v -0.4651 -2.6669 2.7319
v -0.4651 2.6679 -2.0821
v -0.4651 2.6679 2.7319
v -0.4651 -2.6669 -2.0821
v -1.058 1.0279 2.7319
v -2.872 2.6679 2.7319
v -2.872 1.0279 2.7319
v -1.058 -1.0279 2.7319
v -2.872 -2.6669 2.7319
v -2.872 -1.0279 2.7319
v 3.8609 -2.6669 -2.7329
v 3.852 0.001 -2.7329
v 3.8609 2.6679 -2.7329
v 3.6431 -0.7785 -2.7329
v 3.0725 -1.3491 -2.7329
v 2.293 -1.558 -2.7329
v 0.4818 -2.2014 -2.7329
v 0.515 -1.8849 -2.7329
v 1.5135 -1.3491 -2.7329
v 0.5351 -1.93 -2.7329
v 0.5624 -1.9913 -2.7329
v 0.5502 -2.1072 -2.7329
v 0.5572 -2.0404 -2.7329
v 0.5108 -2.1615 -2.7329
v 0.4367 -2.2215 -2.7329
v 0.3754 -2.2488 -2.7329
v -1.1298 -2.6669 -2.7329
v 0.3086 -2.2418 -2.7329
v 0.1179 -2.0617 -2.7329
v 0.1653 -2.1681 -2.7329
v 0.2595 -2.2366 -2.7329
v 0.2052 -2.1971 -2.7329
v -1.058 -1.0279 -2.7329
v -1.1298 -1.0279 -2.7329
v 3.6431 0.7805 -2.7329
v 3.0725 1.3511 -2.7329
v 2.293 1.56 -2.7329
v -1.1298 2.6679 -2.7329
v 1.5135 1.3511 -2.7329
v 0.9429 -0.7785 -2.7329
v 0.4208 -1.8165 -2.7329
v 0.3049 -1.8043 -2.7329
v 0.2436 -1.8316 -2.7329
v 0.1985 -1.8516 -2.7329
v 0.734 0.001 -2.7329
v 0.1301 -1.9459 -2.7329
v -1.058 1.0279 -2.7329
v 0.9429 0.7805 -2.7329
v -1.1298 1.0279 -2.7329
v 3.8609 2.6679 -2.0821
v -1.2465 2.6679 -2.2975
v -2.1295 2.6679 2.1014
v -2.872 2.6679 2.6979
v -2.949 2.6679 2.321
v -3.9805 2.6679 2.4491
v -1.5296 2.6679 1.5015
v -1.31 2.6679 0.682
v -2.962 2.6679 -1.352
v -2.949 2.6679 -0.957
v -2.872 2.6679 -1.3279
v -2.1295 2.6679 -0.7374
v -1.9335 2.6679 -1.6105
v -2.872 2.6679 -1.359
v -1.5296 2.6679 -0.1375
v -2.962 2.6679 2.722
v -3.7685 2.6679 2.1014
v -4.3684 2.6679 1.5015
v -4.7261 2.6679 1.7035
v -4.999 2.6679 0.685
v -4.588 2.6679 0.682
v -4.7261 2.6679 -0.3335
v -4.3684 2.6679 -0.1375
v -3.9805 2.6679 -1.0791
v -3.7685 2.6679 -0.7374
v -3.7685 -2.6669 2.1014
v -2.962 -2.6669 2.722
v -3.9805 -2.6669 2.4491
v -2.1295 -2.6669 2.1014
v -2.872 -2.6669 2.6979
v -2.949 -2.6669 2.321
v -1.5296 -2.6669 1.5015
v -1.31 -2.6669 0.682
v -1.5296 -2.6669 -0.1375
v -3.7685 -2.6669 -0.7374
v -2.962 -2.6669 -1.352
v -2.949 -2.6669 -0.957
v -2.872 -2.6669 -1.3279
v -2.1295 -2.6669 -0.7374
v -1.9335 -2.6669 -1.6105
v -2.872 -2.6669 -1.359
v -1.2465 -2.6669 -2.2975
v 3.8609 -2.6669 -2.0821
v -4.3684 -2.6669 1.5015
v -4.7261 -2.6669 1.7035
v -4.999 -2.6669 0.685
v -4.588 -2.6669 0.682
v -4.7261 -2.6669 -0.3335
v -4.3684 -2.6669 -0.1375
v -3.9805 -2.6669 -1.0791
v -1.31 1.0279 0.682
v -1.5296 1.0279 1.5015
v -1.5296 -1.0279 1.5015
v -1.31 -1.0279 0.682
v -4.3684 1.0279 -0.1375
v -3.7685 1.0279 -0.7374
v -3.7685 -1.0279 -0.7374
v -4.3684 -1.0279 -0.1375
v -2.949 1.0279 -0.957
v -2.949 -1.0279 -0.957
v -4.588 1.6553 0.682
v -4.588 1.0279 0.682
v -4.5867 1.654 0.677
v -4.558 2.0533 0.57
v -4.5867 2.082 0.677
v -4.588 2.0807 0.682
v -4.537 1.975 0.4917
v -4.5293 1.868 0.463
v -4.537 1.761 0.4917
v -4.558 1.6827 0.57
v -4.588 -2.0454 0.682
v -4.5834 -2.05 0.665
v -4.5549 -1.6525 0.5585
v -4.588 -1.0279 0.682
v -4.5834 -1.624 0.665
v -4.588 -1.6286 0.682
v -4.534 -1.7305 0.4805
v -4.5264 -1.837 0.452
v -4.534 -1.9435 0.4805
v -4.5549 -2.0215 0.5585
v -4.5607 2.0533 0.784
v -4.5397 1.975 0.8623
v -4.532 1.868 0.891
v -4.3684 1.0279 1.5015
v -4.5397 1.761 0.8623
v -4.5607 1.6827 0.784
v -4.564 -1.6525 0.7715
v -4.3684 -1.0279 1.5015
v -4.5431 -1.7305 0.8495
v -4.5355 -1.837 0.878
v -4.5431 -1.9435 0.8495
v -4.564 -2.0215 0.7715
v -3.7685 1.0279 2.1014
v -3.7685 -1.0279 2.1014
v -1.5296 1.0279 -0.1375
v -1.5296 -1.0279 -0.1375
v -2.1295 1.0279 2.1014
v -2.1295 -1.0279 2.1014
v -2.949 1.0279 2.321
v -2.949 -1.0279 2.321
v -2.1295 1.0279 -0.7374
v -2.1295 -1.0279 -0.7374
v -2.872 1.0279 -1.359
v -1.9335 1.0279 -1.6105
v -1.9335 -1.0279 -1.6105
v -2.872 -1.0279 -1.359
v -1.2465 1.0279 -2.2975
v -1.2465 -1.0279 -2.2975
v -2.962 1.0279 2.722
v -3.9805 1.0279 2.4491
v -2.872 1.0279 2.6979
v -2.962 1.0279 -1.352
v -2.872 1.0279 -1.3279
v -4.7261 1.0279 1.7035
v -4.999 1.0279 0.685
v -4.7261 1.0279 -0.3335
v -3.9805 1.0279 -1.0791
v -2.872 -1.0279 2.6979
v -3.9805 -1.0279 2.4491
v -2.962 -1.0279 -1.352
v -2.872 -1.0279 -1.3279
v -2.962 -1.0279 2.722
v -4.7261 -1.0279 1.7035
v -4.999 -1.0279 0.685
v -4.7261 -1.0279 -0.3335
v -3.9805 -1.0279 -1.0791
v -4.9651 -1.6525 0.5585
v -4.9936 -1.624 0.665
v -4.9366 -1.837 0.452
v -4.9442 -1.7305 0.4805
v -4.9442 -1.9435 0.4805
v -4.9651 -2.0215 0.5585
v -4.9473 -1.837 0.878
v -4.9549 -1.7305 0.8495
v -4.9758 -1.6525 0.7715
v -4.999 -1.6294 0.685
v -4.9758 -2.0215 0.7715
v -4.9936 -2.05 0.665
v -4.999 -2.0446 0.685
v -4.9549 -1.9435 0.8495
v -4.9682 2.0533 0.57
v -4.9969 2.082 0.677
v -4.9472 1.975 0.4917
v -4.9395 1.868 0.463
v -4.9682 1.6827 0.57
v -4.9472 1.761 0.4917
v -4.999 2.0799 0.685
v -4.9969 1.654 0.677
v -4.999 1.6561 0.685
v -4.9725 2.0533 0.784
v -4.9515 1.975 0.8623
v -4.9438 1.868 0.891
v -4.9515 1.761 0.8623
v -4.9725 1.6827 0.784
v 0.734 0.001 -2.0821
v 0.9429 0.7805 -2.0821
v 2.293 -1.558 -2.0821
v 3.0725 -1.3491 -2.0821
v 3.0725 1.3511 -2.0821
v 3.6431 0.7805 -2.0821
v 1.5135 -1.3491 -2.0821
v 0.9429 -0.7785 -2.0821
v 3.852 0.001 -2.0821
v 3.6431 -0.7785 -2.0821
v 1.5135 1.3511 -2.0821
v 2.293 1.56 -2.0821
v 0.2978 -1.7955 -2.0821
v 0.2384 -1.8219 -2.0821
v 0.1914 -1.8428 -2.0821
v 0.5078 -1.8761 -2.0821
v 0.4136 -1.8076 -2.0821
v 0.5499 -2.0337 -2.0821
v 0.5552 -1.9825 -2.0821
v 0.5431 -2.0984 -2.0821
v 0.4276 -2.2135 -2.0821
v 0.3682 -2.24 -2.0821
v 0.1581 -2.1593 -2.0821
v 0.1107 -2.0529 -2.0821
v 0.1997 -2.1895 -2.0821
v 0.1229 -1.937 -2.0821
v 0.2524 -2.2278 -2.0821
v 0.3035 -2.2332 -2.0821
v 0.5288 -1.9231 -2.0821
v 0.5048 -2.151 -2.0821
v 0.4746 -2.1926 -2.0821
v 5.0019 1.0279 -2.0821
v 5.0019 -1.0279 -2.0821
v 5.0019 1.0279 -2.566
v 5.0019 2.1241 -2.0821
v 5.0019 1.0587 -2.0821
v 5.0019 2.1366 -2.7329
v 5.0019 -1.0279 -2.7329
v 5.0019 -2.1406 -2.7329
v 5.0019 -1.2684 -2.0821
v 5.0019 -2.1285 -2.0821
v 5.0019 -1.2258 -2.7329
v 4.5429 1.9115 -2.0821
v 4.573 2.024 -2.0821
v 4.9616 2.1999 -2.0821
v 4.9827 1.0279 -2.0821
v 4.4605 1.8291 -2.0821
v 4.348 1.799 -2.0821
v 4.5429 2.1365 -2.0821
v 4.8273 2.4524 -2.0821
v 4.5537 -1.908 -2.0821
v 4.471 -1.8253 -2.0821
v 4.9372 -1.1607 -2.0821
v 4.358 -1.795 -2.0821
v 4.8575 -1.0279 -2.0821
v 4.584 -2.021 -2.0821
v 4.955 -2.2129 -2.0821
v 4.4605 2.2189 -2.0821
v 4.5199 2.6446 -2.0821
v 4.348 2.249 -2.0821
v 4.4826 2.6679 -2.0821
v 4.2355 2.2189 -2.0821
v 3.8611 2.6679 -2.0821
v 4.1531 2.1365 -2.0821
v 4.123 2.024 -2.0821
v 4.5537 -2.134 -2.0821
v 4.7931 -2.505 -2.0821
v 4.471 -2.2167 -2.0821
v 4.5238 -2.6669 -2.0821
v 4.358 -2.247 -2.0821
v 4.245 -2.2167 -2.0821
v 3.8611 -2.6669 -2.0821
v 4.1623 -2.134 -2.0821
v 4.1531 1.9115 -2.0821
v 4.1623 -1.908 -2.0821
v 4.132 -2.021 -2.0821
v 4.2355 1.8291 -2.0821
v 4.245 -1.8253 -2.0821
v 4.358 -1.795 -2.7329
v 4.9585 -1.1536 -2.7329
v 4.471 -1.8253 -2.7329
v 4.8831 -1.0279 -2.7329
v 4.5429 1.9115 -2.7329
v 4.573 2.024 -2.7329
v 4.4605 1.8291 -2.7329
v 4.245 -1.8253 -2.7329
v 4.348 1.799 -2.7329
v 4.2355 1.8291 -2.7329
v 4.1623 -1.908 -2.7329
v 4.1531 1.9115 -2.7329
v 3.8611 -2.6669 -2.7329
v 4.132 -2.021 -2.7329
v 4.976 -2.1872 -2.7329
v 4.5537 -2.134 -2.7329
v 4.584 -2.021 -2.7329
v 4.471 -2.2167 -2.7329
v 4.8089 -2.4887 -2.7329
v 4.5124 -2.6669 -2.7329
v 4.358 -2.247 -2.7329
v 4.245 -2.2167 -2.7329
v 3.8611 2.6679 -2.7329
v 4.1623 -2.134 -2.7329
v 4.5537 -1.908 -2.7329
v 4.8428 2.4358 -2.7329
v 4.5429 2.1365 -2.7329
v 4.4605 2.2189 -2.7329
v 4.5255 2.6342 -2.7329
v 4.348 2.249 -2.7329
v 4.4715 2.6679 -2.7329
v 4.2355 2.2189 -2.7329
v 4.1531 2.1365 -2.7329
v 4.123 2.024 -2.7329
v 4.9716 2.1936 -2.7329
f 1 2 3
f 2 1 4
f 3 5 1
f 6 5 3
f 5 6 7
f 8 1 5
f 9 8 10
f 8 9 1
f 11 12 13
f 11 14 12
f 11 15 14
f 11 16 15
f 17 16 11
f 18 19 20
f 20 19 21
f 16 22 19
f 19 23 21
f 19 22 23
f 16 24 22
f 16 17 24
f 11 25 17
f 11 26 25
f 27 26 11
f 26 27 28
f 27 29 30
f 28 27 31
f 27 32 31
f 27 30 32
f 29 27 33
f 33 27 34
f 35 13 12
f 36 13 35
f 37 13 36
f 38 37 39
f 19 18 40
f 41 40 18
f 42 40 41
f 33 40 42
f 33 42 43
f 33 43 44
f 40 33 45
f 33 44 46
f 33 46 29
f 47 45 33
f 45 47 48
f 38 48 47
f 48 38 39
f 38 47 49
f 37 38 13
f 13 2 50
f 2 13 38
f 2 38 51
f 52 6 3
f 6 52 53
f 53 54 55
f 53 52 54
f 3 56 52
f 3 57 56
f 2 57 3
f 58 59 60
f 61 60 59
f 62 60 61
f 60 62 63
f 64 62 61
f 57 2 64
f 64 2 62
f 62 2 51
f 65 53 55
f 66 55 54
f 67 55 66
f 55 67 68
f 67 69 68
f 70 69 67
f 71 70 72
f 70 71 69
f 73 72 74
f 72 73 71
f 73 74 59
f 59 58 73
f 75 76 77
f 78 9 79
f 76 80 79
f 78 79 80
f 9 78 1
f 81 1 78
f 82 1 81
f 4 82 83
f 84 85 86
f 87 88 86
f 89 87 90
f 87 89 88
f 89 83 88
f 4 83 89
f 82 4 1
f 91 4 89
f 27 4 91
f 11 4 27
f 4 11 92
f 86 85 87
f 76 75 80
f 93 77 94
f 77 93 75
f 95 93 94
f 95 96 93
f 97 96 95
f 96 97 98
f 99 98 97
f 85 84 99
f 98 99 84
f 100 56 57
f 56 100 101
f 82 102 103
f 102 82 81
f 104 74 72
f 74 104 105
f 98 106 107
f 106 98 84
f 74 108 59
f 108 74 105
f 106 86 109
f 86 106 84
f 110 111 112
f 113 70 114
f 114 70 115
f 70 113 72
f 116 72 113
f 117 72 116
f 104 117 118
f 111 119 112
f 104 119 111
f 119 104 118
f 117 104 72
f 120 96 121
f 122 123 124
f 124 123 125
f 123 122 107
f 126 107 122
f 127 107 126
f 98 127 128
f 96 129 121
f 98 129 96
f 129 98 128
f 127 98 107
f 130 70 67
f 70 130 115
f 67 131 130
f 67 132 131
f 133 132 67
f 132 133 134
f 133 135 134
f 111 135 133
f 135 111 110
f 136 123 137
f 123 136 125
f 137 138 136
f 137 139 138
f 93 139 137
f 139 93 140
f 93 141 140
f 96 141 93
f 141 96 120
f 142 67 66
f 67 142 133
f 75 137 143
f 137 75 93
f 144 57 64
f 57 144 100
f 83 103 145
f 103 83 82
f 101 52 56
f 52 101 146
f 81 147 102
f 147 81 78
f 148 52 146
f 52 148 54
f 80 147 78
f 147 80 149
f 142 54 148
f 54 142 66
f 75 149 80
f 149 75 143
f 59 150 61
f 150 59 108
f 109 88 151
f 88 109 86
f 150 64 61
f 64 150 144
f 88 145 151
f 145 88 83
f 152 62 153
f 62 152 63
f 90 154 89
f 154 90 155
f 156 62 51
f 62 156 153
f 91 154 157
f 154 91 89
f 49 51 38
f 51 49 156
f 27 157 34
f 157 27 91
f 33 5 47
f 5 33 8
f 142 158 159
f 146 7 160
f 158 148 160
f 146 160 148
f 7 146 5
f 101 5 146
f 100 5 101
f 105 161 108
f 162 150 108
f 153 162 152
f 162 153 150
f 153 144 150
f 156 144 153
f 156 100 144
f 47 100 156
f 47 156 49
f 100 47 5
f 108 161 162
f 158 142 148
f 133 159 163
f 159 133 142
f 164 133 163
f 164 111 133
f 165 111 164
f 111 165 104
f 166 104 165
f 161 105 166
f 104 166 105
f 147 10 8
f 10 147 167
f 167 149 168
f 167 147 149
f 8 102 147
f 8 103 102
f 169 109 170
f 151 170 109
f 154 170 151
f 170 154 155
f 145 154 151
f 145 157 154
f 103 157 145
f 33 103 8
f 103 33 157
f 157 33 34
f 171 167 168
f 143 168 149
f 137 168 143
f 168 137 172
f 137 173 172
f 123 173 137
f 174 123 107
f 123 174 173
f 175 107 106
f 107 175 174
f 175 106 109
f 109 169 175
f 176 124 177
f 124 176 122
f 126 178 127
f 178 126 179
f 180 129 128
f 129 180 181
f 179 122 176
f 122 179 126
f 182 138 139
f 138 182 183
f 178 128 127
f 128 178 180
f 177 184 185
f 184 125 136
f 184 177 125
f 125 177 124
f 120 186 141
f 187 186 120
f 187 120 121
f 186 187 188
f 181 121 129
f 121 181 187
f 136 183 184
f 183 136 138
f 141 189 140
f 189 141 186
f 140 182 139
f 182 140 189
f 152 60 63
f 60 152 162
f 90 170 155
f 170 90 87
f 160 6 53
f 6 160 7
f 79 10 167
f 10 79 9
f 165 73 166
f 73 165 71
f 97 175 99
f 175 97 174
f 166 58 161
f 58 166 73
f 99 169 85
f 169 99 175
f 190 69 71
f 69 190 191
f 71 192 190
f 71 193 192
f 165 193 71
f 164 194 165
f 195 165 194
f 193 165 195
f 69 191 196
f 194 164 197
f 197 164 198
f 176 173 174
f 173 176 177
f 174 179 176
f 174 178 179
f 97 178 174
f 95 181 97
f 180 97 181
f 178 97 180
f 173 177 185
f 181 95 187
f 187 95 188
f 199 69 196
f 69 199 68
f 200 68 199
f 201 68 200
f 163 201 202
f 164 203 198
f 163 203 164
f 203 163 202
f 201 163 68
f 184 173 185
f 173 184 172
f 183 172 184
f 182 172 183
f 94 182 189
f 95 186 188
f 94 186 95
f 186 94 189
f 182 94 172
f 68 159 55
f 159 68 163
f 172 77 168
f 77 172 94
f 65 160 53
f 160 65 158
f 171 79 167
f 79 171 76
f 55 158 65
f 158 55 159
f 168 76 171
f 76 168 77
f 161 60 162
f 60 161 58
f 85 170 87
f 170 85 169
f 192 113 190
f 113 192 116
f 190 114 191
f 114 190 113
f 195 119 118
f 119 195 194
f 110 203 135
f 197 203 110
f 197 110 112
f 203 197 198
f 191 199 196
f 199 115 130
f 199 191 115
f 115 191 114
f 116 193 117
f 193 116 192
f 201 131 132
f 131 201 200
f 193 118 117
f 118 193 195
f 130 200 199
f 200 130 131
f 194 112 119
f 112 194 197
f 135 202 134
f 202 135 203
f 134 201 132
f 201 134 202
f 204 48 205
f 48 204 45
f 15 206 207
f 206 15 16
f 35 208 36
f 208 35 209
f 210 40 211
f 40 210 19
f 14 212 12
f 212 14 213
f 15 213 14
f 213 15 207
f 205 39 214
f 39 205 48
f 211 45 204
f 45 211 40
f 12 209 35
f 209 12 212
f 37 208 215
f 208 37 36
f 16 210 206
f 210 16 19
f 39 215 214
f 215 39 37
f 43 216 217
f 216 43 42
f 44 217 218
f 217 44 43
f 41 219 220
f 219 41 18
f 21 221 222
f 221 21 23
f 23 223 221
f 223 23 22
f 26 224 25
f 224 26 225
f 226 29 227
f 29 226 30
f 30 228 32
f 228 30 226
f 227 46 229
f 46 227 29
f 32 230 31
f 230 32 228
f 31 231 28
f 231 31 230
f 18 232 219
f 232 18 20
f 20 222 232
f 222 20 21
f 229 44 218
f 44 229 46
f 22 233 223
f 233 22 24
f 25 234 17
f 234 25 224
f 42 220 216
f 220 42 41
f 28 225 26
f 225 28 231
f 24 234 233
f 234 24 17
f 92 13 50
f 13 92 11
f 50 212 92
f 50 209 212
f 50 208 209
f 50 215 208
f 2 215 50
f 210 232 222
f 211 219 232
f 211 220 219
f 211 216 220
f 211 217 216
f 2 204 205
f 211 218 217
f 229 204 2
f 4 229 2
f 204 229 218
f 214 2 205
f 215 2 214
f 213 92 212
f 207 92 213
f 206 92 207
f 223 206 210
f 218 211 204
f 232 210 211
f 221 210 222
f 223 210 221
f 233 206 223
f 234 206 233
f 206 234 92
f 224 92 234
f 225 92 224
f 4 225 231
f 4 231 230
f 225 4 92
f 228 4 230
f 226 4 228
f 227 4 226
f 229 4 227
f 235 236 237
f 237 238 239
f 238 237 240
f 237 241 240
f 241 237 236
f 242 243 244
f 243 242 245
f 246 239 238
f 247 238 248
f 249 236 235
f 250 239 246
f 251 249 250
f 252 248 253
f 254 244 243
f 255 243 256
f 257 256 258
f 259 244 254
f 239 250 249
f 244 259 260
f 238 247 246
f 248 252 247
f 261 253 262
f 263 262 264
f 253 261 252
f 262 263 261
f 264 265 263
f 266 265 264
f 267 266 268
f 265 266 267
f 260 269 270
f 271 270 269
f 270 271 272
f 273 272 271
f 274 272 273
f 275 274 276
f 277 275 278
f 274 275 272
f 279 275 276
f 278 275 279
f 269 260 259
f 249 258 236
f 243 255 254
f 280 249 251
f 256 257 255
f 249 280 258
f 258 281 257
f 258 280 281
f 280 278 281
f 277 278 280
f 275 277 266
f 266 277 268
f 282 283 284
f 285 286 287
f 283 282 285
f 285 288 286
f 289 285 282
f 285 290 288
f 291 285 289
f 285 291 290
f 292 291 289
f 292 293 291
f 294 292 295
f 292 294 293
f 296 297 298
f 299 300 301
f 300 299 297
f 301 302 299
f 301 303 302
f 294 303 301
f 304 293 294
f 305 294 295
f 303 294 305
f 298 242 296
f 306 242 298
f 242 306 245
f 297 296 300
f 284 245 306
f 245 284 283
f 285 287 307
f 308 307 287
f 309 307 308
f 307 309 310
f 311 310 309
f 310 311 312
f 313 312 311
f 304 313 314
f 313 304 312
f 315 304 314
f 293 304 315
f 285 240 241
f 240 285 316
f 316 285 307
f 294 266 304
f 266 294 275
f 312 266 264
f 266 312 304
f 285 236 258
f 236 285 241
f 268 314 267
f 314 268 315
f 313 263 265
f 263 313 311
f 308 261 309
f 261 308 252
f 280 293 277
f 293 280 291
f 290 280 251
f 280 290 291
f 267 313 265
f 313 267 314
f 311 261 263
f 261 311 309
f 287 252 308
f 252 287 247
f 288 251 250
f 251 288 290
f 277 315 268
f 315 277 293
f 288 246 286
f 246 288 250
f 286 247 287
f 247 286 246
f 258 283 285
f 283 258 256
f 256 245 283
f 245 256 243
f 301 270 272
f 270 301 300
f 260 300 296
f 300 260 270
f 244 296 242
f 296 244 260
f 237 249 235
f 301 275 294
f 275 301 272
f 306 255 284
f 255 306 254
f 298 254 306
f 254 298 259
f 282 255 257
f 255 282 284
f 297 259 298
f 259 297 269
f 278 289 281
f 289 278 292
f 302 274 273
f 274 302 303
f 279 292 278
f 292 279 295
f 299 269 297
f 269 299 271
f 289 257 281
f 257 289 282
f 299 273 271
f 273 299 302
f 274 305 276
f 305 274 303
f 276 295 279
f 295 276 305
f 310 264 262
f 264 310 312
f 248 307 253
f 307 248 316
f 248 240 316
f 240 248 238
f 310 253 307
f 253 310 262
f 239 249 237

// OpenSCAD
intersection() {
  cube(size = [11.9998, 6.4018, 6.5578], center = true);

  union() {
    difference() {
      difference() {
        difference() {
          difference() {
            translate([-9.2825, 0.0005, -0.0005])
            cube(size = [17.6348, 5.3348, 5.4648], center = true);
          
            translate([-2.949, 7.7165, 0.682])
            rotate([180, 90, -90])
            cylinder(h = 20.7669, r1 = 1.639, r2 = 1.639, center = true, $fn = 12);
          }
        
          union() {
            translate([-2.872, 0.0005, -3.236])
            rotate([180, 90, -90])
            cylinder(h = 5.3349, r1 = 1.877, r2 = 1.877, center = true, $fn = 12);
          
            translate([-9.579, 0, -0.0005])
            cube(size = [17.0419, 2.0559, 5.4649], center = true);
          }
        }
      
        translate([-10.486, -1.837, 0.665])
        rotate([-180, 90, -180])
        cylinder(h = 15.2279, r1 = 0.213, r2 = 0.213, center = true, $fn = 12);
      }
    
      union() {
        difference() {
          translate([-10.486, 0, -0.0005])
          cube(size = [15.2279, 36.1999, 5.4649], center = true);
        
          translate([-2.962, 0, 0.685])
          rotate([180, 90, -90])
          cylinder(h = 36.2, r1 = 2.037, r2 = 2.037, center = true, $fn = 12);
        }
      
        translate([-10.486, 1.868, 0.677])
        rotate([180, 90, -180])
        cylinder(h = 15.2279, r1 = 0.214, r2 = 0.214, center = true, $fn = 12);
      }
    }
  
    difference() {
      translate([1.4015, 0.0005, -2.4075])
      cube(size = [4.9188, 5.3348, 0.6508], center = true);
    
      union() {
        translate([2.293, 0.001, 0])
        rotate([180, 0, 180])
        cylinder(h = 36.1999, r1 = 1.559, r2 = 1.559, center = true, $fn = 12);
      
        translate([0.309785, -1.98905, 0.0303846])
        rotate([-180, 1, 129])
        cylinder(h = 36.1999, r1 = 0.225, r2 = 0.225, center = true, $fn = 12);
      }
    }
  
    intersection() {
      union() {
        difference() {
          translate([4.4315, 0.82, -2.4075])
          cube(size = [1.1408, 3.6958, 0.6508], center = true);
        
          translate([4.348, 2.024, 7.6835])
          rotate([180, 0, 180])
          cylinder(h = 20.8329, r1 = 0.225, r2 = 0.225, center = true, $fn = 12);
        }
      
        translate([3.91195, -1.75766, 0.0507439])
        rotate([-180, 2, -134])
        cylinder(h = 36.1998, r1 = 1.153, r2 = 1.153, center = true, $fn = 12);
      }
    
      union() {
        translate([3.8601, 1.65235, 0.0497318])
        rotate([180, 2, 133])
        cylinder(h = 36.1998, r1 = 1.253, r2 = 1.253, center = true, $fn = 12);
      
        difference() {
          translate([4.4315, -0.8195, -2.4075])
          cube(size = [1.1408, 3.6948, 0.6508], center = true);
        
          translate([4.358, -2.021, 0])
          cylinder(h = 36.1999, r1 = 0.226, r2 = 0.226, center = true, $fn = 12);
        }
      }
    }
  }
}
